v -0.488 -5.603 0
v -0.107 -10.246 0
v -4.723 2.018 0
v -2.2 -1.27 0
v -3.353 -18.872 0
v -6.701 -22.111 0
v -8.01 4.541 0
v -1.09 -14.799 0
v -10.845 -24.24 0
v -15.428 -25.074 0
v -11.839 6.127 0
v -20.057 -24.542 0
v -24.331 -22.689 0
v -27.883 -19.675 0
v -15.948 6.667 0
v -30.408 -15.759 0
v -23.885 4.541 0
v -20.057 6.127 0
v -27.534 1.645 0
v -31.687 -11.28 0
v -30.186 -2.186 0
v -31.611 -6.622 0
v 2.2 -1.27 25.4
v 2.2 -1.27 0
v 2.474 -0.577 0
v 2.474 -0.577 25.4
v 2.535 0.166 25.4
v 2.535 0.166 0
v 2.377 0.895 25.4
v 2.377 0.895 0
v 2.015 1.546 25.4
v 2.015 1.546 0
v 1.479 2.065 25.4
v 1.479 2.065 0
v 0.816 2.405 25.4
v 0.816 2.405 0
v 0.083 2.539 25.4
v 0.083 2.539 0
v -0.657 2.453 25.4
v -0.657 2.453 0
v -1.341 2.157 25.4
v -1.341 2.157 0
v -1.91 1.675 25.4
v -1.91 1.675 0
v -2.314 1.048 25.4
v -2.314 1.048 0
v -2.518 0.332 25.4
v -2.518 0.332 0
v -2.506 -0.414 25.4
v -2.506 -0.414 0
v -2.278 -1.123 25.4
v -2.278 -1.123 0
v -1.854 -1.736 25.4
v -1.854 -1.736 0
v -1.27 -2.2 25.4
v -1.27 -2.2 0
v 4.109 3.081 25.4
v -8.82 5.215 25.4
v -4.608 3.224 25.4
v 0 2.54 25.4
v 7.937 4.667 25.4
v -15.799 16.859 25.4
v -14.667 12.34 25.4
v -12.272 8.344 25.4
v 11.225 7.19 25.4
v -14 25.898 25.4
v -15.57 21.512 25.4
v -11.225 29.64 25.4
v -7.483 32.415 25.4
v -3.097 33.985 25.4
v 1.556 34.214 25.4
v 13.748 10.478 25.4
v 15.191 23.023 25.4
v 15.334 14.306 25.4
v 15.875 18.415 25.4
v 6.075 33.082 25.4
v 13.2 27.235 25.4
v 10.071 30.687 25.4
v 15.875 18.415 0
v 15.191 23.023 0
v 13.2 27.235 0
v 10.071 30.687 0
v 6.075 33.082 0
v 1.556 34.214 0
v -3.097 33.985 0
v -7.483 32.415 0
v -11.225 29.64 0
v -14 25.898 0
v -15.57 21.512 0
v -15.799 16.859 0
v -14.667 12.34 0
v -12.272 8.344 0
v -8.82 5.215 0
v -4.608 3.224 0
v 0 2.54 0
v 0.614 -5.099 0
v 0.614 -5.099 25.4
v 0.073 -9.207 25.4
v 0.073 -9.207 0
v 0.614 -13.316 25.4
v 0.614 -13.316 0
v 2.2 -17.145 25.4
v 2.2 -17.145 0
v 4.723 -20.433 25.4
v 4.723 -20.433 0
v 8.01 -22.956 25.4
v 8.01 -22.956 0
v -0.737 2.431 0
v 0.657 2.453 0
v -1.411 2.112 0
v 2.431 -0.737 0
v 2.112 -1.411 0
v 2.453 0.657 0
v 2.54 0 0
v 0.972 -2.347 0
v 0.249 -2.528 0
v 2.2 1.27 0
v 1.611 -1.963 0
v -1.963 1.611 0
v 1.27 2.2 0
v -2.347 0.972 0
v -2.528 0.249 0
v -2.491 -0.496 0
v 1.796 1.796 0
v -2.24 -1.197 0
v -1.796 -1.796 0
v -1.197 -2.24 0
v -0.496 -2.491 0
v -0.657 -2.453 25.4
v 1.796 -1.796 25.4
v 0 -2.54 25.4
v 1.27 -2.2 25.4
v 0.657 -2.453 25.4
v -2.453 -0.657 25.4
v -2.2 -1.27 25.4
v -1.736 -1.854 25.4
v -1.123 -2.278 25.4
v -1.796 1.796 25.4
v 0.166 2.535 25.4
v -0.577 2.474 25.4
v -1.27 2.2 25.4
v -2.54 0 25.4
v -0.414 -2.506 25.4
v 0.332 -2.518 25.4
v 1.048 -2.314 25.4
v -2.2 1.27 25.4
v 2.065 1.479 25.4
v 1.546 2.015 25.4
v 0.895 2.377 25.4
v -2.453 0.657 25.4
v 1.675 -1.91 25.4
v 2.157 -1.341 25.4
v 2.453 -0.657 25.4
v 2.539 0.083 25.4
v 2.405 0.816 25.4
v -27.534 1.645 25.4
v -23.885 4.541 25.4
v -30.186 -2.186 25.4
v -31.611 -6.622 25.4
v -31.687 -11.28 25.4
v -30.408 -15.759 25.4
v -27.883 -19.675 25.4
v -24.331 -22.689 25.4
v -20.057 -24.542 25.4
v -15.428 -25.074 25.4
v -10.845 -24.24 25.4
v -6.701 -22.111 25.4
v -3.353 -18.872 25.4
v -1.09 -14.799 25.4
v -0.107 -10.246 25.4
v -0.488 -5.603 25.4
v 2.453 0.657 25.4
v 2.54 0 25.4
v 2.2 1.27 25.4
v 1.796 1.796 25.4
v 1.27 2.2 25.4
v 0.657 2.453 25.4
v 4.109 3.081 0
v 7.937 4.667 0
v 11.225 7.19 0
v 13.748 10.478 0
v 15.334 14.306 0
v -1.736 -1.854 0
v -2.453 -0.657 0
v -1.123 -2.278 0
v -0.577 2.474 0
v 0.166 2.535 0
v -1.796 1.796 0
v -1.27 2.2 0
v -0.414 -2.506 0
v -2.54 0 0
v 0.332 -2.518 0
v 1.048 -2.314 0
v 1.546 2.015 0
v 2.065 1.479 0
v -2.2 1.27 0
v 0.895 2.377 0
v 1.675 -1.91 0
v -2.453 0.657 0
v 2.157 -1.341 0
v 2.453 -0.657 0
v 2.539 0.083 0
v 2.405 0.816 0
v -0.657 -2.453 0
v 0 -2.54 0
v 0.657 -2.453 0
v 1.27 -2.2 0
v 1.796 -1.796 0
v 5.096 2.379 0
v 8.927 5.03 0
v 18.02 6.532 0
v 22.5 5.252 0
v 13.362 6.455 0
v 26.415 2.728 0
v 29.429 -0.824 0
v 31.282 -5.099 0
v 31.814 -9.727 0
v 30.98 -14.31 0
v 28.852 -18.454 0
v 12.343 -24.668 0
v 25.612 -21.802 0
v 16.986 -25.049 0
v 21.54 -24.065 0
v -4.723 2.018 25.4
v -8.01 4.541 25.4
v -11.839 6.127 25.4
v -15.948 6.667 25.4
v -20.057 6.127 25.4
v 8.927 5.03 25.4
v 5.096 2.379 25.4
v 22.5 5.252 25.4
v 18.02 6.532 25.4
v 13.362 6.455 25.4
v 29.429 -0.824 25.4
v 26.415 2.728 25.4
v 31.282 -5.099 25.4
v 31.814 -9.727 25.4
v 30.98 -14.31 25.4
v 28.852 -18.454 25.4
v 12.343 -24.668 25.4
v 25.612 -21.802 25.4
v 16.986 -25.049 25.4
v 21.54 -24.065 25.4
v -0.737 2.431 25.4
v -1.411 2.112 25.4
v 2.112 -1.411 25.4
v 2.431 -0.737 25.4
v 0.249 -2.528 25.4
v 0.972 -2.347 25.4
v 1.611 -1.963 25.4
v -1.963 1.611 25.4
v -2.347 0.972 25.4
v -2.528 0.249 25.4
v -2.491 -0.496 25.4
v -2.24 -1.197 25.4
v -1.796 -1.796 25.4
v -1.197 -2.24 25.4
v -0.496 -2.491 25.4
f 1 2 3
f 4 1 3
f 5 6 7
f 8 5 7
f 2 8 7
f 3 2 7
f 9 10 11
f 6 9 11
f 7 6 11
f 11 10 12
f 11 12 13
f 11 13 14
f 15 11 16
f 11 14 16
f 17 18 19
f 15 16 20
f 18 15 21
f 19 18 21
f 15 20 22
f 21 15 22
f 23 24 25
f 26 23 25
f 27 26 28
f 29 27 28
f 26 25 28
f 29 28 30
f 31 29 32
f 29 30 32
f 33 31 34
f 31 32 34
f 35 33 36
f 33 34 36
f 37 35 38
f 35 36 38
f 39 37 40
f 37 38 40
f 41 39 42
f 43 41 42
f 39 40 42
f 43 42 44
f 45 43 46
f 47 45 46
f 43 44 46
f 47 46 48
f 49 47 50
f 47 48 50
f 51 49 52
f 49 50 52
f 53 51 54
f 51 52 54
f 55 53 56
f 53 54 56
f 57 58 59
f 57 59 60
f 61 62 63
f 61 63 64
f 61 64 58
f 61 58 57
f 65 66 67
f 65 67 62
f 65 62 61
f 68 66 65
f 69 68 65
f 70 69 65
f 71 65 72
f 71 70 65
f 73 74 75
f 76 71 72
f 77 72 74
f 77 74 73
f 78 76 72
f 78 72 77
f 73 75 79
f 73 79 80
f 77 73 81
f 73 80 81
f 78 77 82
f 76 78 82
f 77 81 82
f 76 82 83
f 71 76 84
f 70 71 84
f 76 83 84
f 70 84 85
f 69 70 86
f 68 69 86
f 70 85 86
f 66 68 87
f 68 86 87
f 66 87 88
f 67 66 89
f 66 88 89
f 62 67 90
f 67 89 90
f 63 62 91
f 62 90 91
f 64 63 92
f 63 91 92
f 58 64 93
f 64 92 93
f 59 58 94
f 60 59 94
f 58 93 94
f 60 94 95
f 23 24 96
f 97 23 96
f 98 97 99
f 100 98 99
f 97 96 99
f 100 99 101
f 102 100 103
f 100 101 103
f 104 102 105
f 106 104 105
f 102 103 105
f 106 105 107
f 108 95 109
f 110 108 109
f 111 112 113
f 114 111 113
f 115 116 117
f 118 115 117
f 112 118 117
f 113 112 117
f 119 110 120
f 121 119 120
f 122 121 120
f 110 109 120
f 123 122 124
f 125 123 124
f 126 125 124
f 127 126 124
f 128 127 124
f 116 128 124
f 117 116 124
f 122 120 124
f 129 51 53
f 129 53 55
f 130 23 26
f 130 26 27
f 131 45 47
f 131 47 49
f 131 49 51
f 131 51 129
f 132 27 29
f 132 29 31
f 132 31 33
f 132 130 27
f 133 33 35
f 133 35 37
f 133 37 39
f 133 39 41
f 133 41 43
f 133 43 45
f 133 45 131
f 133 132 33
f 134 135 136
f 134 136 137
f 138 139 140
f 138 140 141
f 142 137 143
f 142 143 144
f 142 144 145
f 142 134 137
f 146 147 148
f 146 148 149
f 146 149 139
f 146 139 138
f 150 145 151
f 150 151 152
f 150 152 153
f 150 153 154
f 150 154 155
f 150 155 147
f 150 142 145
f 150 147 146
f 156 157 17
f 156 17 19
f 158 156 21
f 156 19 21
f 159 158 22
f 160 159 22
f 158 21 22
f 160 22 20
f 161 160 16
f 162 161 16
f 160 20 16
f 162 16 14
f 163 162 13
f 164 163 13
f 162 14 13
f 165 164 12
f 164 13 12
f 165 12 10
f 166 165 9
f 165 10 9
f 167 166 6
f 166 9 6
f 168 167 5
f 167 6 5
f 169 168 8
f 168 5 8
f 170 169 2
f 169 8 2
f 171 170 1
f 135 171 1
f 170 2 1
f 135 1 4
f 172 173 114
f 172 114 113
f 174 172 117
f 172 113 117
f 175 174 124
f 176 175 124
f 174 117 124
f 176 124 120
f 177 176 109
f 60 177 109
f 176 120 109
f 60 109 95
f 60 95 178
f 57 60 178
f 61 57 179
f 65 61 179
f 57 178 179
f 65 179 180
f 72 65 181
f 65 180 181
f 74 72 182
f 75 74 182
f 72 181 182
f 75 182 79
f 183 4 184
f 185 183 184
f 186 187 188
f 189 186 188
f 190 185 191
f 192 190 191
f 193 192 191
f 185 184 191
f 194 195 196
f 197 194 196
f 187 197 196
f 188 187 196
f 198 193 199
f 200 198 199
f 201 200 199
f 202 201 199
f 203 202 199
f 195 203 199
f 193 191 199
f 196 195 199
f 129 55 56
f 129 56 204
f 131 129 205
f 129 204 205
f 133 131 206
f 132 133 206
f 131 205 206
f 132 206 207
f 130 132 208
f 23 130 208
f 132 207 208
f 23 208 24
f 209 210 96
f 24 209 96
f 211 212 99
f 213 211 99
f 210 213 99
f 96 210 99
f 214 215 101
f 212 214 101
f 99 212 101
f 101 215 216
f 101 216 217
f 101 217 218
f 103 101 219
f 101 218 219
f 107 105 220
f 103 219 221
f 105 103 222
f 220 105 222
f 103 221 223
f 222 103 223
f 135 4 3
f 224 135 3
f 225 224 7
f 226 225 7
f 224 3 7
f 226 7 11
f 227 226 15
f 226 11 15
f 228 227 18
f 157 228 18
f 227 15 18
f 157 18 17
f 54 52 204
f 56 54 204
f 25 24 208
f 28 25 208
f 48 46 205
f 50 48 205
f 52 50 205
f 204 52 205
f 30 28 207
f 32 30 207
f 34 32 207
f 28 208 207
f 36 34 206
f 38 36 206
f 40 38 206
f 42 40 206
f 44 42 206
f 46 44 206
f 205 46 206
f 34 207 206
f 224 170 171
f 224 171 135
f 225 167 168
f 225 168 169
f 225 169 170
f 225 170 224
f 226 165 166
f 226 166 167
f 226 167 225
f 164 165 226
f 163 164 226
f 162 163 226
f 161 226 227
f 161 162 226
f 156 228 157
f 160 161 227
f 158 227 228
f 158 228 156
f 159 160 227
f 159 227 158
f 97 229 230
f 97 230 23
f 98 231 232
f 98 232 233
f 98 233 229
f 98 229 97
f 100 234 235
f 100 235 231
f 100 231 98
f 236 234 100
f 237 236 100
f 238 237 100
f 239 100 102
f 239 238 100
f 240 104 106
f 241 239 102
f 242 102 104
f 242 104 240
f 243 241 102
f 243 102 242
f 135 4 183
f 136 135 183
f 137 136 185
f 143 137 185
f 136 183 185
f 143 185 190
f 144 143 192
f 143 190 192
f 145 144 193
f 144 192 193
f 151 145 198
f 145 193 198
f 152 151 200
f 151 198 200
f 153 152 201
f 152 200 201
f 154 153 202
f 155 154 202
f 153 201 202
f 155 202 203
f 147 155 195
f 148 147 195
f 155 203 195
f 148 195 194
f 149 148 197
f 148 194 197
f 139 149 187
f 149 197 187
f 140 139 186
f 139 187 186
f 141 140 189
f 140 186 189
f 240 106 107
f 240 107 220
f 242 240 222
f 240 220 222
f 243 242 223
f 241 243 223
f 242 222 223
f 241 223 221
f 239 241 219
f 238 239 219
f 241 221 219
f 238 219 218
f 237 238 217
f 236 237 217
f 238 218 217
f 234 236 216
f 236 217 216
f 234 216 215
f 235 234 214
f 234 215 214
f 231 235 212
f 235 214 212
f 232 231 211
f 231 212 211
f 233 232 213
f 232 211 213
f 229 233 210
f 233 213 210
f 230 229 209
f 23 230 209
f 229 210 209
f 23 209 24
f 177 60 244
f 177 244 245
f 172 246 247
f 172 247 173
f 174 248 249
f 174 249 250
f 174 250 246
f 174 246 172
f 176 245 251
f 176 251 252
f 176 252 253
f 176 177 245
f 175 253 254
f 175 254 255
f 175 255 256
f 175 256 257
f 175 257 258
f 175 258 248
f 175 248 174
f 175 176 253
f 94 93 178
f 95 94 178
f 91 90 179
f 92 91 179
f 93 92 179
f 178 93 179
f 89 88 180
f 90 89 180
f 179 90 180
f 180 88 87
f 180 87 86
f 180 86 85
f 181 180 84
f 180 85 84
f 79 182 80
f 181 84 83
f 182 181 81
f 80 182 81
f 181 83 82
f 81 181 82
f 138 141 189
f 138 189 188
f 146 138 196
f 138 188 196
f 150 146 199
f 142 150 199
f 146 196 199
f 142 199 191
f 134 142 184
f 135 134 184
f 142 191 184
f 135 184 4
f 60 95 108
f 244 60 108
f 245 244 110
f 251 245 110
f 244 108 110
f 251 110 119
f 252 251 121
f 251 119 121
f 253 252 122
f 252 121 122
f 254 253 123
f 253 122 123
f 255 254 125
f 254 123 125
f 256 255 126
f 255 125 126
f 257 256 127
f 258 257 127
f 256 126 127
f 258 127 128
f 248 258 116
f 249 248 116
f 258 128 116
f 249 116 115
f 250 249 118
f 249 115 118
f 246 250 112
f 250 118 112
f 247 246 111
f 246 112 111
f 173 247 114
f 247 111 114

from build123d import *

# Parameters (mm, degrees)
F1_DEPTH = 25.4
F2_DEPTH = 25.4
F3_COUNT = 3


with BuildPart() as f1:
    # F0 (on Top) → F1 (new body)
    with BuildSketch(Plane.XY):
        with BuildLine():
            ThreePointArc((15.875, 18.415), (-11.22532, 29.64032), (0, 2.54))
            ThreePointArc((0, 2.54), (11.22532, 7.18968), (15.875, 18.415))
        make_face()
    extrude(amount=F1_DEPTH)

    # F0 (on Top) → F2 (join)
    with BuildSketch(Plane.XY):
        with BuildLine():
            ThreePointArc((0, 2.54), (-1.796051, -1.796051), (2.54, 0))
            ThreePointArc((2.54, 0), (1.796051, 1.796051), (0, 2.54))
        make_face()
        with BuildLine():
            ThreePointArc((15.875, 18.415), (-11.22532, 29.64032), (0, 2.54))
            ThreePointArc((0, 2.54), (11.22532, 7.18968), (15.875, 18.415))
        make_face()
    extrude(amount=F2_DEPTH)


with BuildPart() as f3_1:
    # F3: instance of F1
    add(f1.part.rotate(Axis((0, 0, 0), (0, 0, -1)), 1 * 360 / F3_COUNT))


with BuildPart() as f3_2:
    # F3: instance of F1
    add(f1.part.rotate(Axis((0, 0, 0), (0, 0, -1)), 2 * 360 / F3_COUNT))


solid = Compound([f1.part, f3_1.part, f3_2.part])
